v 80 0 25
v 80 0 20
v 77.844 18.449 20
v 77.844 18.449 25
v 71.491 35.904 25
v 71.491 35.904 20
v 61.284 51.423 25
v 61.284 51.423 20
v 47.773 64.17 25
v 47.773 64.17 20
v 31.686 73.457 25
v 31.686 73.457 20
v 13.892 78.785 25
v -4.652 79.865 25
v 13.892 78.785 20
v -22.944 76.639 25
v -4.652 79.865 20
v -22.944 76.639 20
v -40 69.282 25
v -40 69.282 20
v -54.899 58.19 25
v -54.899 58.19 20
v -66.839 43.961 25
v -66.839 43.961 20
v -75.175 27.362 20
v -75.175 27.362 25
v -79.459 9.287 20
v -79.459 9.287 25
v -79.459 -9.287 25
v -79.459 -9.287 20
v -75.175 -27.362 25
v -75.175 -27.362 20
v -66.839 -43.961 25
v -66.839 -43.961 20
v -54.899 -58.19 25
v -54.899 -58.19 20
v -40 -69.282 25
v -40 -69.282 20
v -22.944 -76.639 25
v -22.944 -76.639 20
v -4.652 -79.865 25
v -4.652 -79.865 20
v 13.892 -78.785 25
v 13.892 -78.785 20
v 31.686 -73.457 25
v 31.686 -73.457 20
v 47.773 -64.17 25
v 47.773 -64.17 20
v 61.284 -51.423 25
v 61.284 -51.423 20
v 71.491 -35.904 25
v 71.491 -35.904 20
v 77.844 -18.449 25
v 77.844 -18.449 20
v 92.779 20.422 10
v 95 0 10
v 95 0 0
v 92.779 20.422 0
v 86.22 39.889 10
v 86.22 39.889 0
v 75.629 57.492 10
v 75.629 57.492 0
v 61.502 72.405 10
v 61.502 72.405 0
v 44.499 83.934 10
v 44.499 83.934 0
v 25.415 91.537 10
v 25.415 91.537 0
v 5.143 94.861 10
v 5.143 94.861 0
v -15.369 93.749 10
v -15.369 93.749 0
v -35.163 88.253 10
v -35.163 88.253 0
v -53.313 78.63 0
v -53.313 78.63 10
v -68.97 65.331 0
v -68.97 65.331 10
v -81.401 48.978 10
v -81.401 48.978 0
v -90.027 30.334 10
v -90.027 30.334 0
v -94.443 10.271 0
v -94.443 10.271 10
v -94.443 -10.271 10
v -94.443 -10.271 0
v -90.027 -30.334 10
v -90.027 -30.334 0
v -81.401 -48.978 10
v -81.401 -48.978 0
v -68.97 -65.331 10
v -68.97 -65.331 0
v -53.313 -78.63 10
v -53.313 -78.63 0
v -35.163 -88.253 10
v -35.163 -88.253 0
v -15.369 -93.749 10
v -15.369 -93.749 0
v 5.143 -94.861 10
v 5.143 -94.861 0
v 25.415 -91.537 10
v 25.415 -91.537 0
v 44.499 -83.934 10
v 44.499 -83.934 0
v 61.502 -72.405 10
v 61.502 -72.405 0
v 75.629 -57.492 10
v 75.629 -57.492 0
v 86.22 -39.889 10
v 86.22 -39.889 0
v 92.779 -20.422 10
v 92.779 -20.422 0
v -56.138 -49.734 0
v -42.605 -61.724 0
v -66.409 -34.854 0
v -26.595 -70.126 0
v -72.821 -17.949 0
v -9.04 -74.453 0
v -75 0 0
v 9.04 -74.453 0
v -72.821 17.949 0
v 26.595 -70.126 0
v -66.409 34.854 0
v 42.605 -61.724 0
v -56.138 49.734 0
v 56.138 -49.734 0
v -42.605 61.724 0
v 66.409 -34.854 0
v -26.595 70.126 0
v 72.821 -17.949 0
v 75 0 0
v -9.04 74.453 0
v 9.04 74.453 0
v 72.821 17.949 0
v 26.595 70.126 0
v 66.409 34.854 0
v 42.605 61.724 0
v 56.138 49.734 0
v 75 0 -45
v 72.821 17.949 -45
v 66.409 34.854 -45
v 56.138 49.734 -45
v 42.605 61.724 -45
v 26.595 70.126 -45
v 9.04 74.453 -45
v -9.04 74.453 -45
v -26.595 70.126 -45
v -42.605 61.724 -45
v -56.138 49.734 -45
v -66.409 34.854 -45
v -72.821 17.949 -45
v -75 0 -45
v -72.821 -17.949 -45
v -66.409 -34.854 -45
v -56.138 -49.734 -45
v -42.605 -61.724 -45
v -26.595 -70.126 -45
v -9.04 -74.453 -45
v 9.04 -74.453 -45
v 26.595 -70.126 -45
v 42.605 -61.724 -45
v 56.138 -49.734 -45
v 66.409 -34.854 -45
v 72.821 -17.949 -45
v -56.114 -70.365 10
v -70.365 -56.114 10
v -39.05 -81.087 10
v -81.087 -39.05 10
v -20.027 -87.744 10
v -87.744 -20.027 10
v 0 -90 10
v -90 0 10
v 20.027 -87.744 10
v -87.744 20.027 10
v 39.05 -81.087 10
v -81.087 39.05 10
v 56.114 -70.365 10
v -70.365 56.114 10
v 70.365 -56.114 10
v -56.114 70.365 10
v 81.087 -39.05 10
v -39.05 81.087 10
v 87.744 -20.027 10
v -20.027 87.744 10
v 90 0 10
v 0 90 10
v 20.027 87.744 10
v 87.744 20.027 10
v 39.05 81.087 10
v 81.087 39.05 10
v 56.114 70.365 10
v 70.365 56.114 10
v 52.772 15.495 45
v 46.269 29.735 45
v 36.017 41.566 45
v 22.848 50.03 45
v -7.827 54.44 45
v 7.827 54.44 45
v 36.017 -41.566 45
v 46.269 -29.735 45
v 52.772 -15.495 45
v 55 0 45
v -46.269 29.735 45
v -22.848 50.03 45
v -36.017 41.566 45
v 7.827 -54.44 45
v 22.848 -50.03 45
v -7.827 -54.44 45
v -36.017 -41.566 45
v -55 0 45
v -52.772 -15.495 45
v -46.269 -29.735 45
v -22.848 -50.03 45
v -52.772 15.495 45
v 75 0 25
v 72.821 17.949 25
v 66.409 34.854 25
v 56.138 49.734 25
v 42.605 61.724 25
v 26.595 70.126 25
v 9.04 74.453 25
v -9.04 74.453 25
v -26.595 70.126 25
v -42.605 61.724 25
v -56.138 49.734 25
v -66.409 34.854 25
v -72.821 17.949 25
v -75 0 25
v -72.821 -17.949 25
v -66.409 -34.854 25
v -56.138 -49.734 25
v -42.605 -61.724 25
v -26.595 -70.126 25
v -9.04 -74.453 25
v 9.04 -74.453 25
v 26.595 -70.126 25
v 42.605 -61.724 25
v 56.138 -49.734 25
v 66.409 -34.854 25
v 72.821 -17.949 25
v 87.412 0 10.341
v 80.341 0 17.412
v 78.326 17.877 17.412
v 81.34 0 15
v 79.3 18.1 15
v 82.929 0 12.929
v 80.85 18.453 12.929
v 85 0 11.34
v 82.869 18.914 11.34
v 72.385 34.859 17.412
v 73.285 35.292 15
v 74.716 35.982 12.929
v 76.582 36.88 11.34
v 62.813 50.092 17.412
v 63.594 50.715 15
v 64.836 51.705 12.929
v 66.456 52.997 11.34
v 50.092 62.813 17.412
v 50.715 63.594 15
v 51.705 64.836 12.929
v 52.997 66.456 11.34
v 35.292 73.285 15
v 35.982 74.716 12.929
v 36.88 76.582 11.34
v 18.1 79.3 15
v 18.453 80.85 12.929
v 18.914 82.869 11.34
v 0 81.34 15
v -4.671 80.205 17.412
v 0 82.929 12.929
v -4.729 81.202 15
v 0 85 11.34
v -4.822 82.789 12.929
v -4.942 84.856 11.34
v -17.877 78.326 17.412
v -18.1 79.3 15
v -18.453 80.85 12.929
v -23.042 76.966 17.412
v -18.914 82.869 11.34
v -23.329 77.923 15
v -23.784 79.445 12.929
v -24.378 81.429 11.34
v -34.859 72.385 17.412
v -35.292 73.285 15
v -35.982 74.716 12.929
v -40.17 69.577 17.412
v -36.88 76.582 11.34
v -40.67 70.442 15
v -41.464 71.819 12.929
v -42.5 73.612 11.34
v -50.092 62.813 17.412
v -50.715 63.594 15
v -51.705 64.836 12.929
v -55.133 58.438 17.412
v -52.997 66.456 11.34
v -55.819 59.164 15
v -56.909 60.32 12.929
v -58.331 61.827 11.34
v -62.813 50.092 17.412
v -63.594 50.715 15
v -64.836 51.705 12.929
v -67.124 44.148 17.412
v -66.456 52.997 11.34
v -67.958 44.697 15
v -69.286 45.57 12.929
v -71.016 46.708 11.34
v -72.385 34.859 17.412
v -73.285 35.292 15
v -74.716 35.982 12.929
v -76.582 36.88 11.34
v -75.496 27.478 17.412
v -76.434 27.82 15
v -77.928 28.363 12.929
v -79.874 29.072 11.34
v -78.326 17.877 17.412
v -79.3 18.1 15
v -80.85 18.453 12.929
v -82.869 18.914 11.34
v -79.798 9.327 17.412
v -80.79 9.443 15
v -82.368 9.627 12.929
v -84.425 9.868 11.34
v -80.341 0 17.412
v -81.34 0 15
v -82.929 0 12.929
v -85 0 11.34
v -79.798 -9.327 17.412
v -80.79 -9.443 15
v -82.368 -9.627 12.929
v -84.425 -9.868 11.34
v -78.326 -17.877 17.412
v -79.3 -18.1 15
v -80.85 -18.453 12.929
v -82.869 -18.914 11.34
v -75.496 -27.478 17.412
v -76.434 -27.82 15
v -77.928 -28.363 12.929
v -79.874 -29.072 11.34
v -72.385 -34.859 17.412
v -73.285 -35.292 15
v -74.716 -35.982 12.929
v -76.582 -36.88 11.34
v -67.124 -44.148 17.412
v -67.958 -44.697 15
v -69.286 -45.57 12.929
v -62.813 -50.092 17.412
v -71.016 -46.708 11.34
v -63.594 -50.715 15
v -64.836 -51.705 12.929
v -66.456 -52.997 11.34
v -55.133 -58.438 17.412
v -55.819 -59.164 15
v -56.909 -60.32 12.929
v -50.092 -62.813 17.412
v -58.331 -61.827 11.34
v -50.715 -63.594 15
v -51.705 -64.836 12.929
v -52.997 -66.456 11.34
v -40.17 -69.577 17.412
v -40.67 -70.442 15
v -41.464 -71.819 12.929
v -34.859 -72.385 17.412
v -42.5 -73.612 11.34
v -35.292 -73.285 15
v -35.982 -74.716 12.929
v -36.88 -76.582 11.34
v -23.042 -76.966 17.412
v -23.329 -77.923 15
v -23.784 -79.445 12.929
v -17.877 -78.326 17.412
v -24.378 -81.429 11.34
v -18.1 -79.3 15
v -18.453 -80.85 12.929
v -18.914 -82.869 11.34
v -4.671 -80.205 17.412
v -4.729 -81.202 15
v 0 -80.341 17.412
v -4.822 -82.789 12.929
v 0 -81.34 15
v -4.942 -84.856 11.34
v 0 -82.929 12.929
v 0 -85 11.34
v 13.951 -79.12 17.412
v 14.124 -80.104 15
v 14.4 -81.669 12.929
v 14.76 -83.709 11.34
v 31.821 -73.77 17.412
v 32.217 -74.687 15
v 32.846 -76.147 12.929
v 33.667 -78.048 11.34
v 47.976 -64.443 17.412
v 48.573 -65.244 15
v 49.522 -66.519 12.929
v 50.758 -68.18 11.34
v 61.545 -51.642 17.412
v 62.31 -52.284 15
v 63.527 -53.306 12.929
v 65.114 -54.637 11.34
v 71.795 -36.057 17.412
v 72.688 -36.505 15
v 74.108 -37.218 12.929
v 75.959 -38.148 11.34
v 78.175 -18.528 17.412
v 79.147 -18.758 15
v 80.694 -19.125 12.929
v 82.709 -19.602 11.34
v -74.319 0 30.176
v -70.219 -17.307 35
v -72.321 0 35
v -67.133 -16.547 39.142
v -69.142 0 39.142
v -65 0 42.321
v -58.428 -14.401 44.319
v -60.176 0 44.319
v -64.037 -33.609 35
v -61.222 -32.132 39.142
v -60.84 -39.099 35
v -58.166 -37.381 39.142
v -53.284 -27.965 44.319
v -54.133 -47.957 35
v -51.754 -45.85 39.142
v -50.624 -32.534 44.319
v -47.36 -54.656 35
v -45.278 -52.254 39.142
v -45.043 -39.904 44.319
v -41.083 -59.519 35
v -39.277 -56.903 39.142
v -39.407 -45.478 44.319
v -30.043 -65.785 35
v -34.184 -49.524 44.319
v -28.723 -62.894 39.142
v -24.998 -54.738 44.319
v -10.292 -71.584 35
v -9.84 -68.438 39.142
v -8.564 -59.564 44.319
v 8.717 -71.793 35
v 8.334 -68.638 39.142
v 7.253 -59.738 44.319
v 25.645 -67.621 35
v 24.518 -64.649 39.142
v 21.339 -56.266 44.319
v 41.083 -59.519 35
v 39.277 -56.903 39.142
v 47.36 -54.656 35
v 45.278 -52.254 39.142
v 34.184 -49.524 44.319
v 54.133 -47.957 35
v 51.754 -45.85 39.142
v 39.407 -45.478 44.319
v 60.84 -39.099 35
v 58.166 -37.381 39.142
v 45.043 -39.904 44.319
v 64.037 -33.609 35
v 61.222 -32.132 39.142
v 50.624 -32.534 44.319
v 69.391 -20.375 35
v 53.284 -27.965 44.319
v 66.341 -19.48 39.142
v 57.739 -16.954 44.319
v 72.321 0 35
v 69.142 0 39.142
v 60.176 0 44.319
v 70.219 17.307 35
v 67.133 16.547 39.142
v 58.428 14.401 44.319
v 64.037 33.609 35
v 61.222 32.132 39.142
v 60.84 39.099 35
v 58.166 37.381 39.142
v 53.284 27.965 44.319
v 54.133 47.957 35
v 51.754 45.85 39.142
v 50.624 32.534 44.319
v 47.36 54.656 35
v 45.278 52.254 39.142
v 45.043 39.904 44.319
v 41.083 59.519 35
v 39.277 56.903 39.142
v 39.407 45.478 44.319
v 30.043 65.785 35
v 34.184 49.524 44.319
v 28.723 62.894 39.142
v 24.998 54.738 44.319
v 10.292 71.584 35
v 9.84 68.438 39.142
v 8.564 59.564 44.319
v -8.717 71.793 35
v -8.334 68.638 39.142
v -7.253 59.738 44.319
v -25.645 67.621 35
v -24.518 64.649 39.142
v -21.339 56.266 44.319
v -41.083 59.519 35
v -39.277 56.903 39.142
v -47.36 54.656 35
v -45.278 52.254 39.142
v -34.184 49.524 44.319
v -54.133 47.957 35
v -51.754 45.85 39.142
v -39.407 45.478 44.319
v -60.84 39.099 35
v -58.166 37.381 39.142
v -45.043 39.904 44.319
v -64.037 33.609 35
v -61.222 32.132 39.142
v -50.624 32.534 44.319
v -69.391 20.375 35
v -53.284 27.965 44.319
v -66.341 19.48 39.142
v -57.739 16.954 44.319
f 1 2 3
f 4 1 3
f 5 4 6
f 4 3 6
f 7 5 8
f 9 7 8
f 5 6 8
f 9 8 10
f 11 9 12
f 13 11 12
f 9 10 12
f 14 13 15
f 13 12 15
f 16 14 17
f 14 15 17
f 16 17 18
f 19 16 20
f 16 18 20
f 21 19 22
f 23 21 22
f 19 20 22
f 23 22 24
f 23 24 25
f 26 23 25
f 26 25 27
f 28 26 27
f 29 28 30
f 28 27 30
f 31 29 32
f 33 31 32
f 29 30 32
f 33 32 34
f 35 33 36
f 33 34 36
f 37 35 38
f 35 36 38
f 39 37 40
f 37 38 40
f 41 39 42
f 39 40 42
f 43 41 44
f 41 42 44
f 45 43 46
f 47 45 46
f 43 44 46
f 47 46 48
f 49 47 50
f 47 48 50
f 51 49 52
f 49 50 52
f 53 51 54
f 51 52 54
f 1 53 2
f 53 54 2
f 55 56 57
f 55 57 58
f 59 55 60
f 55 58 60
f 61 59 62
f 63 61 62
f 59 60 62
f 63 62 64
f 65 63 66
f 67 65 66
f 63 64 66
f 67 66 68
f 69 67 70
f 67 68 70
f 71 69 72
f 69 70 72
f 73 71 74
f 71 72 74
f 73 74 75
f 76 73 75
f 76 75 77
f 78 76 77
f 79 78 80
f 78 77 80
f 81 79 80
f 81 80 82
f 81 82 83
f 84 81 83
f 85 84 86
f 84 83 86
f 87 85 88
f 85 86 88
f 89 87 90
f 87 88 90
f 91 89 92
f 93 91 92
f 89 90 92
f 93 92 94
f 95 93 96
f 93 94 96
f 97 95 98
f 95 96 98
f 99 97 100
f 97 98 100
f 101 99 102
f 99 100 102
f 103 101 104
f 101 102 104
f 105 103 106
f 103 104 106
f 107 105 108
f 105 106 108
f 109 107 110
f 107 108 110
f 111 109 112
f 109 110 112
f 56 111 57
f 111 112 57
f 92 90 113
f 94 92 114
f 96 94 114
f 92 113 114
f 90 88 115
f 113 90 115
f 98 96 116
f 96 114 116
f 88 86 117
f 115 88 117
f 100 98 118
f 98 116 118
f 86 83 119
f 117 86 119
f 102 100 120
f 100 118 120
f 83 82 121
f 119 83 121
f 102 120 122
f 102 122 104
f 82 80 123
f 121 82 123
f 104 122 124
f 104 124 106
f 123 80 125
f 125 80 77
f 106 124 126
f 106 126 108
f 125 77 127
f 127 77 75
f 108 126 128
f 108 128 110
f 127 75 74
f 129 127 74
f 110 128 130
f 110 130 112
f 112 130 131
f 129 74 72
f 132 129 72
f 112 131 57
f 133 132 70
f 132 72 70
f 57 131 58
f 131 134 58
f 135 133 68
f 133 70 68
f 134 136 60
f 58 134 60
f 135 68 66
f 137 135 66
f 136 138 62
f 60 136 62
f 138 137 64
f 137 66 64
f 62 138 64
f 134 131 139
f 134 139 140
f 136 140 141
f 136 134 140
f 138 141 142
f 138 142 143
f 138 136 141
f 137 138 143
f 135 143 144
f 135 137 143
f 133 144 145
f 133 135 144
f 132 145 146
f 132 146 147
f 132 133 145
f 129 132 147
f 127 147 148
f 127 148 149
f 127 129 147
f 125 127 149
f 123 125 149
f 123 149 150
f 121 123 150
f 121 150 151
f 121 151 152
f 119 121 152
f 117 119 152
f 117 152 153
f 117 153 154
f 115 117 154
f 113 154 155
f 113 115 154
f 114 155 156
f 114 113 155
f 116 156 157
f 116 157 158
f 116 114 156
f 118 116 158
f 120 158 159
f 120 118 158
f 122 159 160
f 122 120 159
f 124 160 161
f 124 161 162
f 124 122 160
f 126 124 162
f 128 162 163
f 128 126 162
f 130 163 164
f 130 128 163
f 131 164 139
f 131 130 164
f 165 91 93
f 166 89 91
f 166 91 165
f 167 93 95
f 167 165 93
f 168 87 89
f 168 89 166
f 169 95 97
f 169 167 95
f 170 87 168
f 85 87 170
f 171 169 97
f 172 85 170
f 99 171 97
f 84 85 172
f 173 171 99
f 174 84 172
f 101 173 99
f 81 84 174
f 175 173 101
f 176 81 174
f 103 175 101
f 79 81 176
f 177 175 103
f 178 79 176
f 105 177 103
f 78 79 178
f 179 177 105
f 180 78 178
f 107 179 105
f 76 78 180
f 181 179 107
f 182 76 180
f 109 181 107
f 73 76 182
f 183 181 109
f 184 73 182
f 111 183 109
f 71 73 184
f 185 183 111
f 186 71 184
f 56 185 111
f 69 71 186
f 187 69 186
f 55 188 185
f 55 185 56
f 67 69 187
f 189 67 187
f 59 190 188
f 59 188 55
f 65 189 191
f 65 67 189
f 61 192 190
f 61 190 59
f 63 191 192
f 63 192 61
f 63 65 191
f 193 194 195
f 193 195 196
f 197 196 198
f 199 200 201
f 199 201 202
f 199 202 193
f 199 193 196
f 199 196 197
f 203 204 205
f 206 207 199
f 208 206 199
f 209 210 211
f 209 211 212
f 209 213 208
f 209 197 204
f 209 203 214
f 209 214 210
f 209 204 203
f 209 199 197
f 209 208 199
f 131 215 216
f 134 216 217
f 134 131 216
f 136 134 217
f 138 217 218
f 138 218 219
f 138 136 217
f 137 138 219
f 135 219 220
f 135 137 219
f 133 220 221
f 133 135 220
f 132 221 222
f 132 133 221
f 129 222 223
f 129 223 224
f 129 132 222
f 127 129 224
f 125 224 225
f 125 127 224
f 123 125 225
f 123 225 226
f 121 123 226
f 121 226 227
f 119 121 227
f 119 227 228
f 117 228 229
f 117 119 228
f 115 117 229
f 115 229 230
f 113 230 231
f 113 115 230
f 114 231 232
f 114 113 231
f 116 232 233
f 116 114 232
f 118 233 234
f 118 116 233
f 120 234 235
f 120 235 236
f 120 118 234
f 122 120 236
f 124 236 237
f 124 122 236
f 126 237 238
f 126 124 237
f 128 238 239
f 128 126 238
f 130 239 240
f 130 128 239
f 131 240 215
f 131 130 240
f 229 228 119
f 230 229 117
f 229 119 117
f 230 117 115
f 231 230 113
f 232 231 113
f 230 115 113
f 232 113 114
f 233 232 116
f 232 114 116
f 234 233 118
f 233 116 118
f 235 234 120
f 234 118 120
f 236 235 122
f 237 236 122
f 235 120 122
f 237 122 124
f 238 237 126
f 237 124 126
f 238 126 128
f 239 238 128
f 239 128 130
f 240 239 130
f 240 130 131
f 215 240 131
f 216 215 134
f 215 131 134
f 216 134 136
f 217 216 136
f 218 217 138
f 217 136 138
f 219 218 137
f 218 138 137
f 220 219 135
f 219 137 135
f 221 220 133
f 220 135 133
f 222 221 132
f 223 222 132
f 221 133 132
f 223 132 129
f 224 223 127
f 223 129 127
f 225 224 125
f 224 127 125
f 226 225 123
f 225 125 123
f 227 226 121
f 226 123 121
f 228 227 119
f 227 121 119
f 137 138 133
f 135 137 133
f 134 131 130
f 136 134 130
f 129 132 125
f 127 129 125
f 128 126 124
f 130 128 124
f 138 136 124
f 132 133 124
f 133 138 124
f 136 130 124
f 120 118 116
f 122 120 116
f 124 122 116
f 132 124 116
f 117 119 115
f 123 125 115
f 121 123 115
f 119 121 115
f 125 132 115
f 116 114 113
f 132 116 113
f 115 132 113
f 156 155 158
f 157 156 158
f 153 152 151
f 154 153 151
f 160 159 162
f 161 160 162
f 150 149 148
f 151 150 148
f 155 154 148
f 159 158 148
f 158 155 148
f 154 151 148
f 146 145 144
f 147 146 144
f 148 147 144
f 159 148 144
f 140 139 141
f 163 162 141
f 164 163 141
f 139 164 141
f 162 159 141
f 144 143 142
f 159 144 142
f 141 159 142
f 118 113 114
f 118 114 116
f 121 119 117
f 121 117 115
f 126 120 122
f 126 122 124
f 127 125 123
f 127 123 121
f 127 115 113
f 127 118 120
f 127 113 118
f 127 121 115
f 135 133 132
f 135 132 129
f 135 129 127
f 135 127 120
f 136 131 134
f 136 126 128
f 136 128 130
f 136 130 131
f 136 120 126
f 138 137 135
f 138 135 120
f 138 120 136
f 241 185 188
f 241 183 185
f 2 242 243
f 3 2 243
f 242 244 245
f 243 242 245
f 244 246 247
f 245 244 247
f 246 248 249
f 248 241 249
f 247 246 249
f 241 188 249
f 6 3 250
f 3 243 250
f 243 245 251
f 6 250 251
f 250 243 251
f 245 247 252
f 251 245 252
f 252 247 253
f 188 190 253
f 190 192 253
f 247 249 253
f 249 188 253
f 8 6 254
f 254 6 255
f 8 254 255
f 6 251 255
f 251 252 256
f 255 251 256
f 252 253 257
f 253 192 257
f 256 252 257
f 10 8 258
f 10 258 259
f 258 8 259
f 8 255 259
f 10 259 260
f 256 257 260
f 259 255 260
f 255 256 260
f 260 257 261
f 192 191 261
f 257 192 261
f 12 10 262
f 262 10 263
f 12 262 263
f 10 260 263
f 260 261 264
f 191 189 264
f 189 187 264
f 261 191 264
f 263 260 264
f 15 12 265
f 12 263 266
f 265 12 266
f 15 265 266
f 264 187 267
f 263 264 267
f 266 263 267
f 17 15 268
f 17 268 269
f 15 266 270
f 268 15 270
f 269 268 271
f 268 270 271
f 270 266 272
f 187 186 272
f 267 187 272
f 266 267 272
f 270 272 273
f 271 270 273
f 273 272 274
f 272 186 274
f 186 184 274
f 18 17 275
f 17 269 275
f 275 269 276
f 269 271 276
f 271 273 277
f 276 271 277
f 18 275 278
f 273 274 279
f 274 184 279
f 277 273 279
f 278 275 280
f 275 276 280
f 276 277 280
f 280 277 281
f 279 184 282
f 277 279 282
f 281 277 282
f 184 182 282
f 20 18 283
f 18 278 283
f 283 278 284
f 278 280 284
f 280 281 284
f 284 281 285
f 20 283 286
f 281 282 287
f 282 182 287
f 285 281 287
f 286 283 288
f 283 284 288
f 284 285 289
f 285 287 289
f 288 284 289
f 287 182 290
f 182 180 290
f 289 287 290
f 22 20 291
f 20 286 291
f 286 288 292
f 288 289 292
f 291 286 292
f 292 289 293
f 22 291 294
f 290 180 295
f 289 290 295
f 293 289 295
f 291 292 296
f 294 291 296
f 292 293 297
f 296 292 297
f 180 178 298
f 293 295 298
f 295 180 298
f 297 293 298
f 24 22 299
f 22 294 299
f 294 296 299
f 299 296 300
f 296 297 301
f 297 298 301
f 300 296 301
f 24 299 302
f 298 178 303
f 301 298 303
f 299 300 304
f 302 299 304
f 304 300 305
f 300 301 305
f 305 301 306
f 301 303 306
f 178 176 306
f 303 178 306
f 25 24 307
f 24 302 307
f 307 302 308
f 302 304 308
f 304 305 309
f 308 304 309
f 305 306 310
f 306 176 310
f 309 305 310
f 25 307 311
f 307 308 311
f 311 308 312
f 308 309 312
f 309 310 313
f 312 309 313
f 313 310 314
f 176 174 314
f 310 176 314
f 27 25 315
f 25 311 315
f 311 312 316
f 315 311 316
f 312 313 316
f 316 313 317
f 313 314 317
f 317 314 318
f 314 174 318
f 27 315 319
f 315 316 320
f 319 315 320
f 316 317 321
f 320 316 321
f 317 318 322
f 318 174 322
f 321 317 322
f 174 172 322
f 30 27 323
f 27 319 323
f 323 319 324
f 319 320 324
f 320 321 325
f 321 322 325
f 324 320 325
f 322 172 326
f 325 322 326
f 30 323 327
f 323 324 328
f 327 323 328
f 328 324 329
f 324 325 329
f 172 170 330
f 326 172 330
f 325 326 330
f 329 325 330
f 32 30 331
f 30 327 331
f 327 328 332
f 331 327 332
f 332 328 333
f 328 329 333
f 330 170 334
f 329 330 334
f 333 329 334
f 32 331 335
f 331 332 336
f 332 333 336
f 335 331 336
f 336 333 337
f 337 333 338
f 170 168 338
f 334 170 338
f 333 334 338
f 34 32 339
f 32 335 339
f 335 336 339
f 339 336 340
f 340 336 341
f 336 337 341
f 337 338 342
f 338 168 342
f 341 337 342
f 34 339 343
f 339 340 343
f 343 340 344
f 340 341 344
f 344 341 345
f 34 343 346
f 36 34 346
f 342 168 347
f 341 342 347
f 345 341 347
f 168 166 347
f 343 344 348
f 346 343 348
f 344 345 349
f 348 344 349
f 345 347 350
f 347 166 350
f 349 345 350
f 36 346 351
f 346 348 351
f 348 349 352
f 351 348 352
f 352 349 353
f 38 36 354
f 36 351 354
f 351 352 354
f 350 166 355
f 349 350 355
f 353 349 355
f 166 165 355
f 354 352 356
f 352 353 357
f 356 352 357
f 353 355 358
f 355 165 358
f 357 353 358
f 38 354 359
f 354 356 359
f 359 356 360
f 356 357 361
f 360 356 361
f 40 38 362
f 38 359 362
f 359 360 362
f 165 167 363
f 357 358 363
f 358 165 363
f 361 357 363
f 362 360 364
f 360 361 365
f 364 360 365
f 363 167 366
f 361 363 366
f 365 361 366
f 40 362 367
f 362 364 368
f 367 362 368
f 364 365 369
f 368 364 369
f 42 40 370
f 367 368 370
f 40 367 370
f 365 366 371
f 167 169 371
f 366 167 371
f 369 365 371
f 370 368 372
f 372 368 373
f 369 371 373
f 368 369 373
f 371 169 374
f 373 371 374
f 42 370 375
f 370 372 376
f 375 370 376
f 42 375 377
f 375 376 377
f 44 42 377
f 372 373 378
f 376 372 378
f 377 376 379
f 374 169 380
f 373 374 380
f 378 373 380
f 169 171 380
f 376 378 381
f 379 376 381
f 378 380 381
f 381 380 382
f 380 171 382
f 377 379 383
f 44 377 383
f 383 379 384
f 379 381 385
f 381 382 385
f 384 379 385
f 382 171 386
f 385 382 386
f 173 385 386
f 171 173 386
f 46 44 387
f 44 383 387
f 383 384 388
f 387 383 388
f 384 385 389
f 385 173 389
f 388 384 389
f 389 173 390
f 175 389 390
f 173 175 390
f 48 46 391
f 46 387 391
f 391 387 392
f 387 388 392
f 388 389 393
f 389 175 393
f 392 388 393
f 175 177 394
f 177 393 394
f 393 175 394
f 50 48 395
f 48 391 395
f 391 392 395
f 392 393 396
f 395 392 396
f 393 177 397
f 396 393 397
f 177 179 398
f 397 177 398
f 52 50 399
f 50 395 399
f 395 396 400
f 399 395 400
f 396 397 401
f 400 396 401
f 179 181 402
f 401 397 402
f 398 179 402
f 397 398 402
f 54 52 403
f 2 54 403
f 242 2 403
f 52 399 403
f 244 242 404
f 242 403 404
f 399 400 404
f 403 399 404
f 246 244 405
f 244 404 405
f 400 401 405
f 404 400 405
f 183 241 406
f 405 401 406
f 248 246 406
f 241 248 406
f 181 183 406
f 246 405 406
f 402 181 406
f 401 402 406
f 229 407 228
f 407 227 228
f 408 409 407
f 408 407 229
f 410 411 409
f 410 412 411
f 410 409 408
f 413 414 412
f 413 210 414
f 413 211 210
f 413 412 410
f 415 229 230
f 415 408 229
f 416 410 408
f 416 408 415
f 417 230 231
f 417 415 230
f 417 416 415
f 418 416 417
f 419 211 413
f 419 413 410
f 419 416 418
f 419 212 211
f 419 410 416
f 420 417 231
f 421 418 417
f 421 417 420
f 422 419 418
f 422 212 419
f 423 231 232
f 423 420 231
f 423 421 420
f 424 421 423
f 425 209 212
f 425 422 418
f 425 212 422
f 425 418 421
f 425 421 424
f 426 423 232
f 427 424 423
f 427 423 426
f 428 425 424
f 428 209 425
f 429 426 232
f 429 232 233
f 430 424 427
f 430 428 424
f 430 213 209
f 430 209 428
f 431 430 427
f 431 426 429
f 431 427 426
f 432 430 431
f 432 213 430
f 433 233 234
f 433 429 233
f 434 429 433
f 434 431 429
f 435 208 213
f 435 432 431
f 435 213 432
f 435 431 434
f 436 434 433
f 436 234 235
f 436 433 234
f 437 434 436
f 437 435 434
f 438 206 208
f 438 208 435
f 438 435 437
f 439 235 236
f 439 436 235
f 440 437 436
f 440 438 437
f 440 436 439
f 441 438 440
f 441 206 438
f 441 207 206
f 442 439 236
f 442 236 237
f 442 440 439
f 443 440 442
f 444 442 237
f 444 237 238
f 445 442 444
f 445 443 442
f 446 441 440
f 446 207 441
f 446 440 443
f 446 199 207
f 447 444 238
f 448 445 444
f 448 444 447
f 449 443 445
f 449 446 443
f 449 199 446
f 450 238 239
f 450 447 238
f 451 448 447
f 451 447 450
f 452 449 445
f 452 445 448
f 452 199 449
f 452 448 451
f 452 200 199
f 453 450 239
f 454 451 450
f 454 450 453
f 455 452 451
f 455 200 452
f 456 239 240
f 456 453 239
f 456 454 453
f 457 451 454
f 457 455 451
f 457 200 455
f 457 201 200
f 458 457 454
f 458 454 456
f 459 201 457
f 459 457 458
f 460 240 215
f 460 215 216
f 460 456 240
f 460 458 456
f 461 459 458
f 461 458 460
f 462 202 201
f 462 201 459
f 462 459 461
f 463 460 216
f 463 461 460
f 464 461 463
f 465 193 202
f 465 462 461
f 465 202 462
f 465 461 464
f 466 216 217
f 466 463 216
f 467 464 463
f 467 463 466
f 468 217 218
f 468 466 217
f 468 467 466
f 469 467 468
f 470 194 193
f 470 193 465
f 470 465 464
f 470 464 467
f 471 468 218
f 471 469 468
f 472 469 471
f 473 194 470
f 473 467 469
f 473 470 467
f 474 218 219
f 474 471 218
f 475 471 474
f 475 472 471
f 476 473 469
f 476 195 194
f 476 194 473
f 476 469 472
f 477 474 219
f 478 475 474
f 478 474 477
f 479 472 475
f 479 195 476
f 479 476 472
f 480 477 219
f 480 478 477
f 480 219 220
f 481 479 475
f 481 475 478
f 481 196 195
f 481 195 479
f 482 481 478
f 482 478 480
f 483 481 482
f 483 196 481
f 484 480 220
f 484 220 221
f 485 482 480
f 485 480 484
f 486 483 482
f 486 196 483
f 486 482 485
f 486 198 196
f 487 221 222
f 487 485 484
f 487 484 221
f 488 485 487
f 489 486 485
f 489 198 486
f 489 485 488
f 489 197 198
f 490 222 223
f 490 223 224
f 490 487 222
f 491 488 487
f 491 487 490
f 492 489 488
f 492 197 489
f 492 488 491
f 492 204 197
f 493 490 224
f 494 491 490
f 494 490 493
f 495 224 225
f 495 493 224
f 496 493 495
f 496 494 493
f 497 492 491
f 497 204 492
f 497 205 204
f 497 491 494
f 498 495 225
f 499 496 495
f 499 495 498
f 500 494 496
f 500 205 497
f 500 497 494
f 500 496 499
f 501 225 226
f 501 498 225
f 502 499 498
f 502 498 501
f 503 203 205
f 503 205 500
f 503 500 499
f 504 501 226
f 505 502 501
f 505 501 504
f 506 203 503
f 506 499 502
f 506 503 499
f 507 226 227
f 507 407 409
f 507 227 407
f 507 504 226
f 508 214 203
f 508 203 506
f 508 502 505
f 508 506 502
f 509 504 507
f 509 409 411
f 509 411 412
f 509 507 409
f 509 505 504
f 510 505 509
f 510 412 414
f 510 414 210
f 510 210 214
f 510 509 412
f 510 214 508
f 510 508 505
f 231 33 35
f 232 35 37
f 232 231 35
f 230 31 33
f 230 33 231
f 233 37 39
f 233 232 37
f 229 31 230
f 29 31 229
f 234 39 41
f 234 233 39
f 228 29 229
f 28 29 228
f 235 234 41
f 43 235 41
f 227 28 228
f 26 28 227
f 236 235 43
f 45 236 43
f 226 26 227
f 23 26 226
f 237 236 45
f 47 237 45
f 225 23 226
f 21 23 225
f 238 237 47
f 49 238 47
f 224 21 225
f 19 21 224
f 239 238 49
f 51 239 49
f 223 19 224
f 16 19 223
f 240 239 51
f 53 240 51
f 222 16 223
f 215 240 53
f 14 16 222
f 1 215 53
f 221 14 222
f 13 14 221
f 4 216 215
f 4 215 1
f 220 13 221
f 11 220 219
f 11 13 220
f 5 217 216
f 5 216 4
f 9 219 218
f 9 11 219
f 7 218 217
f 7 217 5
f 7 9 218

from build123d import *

# Parameters (mm, degrees)
SKETCH1_R                = 95
SKETCH1_R_2              = 75
BOSS_EXTRUDE1_DEPTH      = 10
SURFACE_EXTRUDE1_1_DEPTH = 15
THICKEN1_T2              = 5
SKETCH4_R                = 75
BOSS_EXTRUDE2_DEPTH      = 45
FILLET1_R                = 20
SKETCH4_2_R              = 75
BOSS_EXTRUDE3_DEPTH      = 45
FILLET2_R                = 10


with BuildPart() as part:
    # Sketch1 → Boss-Extrude1 (new body)
    with BuildSketch(Plane.XY):
        Circle(SKETCH1_R)
        Circle(SKETCH1_R_2, mode=Mode.SUBTRACT)
    extrude(amount=BOSS_EXTRUDE1_DEPTH)

    # Surface-Extrude1: a surface, the sketch's curves swept straight by 15 mm
    with BuildLine(Plane.XY.offset(10), mode=Mode.PRIVATE) as surface_extrude1_1_path:
        CenterArc((0, 0), 75, 0, 360)
    surface_extrude1_1 = Shell.extrude(surface_extrude1_1_path.wire(), (0 * SURFACE_EXTRUDE1_1_DEPTH, 0 * SURFACE_EXTRUDE1_1_DEPTH, 1 * SURFACE_EXTRUDE1_1_DEPTH))
    add(Solid.thicken(surface_extrude1_1, -THICKEN1_T2))

    # Fillet2
    fillet2_edges = [part.edges().sort_by_distance(p)[0] for p in [
        (-80, 0, 10),
    ]]
    fillet(fillet2_edges, radius=FILLET2_R)


with BuildPart() as body_2:
    # Sketch4 → Boss-Extrude2 (new body)
    with BuildSketch(Plane.XY):
        with Locations(Location((0, 0, 0), (0, 0, 180))):
            Circle(SKETCH4_R)
    extrude(amount=BOSS_EXTRUDE2_DEPTH)

    # Fillet1
    fillet1_edges = [body_2.edges().sort_by_distance(p)[0] for p in [
        (75, 0, 45),
    ]]
    fillet(fillet1_edges, radius=FILLET1_R)


with BuildPart() as body_3:
    # Sketch4<2> → Boss-Extrude3 (new body)
    with BuildSketch(Plane.XY):
        Circle(SKETCH4_2_R)
    extrude(amount=-BOSS_EXTRUDE3_DEPTH)


solid = Compound([part.part, body_2.part, body_3.part])
